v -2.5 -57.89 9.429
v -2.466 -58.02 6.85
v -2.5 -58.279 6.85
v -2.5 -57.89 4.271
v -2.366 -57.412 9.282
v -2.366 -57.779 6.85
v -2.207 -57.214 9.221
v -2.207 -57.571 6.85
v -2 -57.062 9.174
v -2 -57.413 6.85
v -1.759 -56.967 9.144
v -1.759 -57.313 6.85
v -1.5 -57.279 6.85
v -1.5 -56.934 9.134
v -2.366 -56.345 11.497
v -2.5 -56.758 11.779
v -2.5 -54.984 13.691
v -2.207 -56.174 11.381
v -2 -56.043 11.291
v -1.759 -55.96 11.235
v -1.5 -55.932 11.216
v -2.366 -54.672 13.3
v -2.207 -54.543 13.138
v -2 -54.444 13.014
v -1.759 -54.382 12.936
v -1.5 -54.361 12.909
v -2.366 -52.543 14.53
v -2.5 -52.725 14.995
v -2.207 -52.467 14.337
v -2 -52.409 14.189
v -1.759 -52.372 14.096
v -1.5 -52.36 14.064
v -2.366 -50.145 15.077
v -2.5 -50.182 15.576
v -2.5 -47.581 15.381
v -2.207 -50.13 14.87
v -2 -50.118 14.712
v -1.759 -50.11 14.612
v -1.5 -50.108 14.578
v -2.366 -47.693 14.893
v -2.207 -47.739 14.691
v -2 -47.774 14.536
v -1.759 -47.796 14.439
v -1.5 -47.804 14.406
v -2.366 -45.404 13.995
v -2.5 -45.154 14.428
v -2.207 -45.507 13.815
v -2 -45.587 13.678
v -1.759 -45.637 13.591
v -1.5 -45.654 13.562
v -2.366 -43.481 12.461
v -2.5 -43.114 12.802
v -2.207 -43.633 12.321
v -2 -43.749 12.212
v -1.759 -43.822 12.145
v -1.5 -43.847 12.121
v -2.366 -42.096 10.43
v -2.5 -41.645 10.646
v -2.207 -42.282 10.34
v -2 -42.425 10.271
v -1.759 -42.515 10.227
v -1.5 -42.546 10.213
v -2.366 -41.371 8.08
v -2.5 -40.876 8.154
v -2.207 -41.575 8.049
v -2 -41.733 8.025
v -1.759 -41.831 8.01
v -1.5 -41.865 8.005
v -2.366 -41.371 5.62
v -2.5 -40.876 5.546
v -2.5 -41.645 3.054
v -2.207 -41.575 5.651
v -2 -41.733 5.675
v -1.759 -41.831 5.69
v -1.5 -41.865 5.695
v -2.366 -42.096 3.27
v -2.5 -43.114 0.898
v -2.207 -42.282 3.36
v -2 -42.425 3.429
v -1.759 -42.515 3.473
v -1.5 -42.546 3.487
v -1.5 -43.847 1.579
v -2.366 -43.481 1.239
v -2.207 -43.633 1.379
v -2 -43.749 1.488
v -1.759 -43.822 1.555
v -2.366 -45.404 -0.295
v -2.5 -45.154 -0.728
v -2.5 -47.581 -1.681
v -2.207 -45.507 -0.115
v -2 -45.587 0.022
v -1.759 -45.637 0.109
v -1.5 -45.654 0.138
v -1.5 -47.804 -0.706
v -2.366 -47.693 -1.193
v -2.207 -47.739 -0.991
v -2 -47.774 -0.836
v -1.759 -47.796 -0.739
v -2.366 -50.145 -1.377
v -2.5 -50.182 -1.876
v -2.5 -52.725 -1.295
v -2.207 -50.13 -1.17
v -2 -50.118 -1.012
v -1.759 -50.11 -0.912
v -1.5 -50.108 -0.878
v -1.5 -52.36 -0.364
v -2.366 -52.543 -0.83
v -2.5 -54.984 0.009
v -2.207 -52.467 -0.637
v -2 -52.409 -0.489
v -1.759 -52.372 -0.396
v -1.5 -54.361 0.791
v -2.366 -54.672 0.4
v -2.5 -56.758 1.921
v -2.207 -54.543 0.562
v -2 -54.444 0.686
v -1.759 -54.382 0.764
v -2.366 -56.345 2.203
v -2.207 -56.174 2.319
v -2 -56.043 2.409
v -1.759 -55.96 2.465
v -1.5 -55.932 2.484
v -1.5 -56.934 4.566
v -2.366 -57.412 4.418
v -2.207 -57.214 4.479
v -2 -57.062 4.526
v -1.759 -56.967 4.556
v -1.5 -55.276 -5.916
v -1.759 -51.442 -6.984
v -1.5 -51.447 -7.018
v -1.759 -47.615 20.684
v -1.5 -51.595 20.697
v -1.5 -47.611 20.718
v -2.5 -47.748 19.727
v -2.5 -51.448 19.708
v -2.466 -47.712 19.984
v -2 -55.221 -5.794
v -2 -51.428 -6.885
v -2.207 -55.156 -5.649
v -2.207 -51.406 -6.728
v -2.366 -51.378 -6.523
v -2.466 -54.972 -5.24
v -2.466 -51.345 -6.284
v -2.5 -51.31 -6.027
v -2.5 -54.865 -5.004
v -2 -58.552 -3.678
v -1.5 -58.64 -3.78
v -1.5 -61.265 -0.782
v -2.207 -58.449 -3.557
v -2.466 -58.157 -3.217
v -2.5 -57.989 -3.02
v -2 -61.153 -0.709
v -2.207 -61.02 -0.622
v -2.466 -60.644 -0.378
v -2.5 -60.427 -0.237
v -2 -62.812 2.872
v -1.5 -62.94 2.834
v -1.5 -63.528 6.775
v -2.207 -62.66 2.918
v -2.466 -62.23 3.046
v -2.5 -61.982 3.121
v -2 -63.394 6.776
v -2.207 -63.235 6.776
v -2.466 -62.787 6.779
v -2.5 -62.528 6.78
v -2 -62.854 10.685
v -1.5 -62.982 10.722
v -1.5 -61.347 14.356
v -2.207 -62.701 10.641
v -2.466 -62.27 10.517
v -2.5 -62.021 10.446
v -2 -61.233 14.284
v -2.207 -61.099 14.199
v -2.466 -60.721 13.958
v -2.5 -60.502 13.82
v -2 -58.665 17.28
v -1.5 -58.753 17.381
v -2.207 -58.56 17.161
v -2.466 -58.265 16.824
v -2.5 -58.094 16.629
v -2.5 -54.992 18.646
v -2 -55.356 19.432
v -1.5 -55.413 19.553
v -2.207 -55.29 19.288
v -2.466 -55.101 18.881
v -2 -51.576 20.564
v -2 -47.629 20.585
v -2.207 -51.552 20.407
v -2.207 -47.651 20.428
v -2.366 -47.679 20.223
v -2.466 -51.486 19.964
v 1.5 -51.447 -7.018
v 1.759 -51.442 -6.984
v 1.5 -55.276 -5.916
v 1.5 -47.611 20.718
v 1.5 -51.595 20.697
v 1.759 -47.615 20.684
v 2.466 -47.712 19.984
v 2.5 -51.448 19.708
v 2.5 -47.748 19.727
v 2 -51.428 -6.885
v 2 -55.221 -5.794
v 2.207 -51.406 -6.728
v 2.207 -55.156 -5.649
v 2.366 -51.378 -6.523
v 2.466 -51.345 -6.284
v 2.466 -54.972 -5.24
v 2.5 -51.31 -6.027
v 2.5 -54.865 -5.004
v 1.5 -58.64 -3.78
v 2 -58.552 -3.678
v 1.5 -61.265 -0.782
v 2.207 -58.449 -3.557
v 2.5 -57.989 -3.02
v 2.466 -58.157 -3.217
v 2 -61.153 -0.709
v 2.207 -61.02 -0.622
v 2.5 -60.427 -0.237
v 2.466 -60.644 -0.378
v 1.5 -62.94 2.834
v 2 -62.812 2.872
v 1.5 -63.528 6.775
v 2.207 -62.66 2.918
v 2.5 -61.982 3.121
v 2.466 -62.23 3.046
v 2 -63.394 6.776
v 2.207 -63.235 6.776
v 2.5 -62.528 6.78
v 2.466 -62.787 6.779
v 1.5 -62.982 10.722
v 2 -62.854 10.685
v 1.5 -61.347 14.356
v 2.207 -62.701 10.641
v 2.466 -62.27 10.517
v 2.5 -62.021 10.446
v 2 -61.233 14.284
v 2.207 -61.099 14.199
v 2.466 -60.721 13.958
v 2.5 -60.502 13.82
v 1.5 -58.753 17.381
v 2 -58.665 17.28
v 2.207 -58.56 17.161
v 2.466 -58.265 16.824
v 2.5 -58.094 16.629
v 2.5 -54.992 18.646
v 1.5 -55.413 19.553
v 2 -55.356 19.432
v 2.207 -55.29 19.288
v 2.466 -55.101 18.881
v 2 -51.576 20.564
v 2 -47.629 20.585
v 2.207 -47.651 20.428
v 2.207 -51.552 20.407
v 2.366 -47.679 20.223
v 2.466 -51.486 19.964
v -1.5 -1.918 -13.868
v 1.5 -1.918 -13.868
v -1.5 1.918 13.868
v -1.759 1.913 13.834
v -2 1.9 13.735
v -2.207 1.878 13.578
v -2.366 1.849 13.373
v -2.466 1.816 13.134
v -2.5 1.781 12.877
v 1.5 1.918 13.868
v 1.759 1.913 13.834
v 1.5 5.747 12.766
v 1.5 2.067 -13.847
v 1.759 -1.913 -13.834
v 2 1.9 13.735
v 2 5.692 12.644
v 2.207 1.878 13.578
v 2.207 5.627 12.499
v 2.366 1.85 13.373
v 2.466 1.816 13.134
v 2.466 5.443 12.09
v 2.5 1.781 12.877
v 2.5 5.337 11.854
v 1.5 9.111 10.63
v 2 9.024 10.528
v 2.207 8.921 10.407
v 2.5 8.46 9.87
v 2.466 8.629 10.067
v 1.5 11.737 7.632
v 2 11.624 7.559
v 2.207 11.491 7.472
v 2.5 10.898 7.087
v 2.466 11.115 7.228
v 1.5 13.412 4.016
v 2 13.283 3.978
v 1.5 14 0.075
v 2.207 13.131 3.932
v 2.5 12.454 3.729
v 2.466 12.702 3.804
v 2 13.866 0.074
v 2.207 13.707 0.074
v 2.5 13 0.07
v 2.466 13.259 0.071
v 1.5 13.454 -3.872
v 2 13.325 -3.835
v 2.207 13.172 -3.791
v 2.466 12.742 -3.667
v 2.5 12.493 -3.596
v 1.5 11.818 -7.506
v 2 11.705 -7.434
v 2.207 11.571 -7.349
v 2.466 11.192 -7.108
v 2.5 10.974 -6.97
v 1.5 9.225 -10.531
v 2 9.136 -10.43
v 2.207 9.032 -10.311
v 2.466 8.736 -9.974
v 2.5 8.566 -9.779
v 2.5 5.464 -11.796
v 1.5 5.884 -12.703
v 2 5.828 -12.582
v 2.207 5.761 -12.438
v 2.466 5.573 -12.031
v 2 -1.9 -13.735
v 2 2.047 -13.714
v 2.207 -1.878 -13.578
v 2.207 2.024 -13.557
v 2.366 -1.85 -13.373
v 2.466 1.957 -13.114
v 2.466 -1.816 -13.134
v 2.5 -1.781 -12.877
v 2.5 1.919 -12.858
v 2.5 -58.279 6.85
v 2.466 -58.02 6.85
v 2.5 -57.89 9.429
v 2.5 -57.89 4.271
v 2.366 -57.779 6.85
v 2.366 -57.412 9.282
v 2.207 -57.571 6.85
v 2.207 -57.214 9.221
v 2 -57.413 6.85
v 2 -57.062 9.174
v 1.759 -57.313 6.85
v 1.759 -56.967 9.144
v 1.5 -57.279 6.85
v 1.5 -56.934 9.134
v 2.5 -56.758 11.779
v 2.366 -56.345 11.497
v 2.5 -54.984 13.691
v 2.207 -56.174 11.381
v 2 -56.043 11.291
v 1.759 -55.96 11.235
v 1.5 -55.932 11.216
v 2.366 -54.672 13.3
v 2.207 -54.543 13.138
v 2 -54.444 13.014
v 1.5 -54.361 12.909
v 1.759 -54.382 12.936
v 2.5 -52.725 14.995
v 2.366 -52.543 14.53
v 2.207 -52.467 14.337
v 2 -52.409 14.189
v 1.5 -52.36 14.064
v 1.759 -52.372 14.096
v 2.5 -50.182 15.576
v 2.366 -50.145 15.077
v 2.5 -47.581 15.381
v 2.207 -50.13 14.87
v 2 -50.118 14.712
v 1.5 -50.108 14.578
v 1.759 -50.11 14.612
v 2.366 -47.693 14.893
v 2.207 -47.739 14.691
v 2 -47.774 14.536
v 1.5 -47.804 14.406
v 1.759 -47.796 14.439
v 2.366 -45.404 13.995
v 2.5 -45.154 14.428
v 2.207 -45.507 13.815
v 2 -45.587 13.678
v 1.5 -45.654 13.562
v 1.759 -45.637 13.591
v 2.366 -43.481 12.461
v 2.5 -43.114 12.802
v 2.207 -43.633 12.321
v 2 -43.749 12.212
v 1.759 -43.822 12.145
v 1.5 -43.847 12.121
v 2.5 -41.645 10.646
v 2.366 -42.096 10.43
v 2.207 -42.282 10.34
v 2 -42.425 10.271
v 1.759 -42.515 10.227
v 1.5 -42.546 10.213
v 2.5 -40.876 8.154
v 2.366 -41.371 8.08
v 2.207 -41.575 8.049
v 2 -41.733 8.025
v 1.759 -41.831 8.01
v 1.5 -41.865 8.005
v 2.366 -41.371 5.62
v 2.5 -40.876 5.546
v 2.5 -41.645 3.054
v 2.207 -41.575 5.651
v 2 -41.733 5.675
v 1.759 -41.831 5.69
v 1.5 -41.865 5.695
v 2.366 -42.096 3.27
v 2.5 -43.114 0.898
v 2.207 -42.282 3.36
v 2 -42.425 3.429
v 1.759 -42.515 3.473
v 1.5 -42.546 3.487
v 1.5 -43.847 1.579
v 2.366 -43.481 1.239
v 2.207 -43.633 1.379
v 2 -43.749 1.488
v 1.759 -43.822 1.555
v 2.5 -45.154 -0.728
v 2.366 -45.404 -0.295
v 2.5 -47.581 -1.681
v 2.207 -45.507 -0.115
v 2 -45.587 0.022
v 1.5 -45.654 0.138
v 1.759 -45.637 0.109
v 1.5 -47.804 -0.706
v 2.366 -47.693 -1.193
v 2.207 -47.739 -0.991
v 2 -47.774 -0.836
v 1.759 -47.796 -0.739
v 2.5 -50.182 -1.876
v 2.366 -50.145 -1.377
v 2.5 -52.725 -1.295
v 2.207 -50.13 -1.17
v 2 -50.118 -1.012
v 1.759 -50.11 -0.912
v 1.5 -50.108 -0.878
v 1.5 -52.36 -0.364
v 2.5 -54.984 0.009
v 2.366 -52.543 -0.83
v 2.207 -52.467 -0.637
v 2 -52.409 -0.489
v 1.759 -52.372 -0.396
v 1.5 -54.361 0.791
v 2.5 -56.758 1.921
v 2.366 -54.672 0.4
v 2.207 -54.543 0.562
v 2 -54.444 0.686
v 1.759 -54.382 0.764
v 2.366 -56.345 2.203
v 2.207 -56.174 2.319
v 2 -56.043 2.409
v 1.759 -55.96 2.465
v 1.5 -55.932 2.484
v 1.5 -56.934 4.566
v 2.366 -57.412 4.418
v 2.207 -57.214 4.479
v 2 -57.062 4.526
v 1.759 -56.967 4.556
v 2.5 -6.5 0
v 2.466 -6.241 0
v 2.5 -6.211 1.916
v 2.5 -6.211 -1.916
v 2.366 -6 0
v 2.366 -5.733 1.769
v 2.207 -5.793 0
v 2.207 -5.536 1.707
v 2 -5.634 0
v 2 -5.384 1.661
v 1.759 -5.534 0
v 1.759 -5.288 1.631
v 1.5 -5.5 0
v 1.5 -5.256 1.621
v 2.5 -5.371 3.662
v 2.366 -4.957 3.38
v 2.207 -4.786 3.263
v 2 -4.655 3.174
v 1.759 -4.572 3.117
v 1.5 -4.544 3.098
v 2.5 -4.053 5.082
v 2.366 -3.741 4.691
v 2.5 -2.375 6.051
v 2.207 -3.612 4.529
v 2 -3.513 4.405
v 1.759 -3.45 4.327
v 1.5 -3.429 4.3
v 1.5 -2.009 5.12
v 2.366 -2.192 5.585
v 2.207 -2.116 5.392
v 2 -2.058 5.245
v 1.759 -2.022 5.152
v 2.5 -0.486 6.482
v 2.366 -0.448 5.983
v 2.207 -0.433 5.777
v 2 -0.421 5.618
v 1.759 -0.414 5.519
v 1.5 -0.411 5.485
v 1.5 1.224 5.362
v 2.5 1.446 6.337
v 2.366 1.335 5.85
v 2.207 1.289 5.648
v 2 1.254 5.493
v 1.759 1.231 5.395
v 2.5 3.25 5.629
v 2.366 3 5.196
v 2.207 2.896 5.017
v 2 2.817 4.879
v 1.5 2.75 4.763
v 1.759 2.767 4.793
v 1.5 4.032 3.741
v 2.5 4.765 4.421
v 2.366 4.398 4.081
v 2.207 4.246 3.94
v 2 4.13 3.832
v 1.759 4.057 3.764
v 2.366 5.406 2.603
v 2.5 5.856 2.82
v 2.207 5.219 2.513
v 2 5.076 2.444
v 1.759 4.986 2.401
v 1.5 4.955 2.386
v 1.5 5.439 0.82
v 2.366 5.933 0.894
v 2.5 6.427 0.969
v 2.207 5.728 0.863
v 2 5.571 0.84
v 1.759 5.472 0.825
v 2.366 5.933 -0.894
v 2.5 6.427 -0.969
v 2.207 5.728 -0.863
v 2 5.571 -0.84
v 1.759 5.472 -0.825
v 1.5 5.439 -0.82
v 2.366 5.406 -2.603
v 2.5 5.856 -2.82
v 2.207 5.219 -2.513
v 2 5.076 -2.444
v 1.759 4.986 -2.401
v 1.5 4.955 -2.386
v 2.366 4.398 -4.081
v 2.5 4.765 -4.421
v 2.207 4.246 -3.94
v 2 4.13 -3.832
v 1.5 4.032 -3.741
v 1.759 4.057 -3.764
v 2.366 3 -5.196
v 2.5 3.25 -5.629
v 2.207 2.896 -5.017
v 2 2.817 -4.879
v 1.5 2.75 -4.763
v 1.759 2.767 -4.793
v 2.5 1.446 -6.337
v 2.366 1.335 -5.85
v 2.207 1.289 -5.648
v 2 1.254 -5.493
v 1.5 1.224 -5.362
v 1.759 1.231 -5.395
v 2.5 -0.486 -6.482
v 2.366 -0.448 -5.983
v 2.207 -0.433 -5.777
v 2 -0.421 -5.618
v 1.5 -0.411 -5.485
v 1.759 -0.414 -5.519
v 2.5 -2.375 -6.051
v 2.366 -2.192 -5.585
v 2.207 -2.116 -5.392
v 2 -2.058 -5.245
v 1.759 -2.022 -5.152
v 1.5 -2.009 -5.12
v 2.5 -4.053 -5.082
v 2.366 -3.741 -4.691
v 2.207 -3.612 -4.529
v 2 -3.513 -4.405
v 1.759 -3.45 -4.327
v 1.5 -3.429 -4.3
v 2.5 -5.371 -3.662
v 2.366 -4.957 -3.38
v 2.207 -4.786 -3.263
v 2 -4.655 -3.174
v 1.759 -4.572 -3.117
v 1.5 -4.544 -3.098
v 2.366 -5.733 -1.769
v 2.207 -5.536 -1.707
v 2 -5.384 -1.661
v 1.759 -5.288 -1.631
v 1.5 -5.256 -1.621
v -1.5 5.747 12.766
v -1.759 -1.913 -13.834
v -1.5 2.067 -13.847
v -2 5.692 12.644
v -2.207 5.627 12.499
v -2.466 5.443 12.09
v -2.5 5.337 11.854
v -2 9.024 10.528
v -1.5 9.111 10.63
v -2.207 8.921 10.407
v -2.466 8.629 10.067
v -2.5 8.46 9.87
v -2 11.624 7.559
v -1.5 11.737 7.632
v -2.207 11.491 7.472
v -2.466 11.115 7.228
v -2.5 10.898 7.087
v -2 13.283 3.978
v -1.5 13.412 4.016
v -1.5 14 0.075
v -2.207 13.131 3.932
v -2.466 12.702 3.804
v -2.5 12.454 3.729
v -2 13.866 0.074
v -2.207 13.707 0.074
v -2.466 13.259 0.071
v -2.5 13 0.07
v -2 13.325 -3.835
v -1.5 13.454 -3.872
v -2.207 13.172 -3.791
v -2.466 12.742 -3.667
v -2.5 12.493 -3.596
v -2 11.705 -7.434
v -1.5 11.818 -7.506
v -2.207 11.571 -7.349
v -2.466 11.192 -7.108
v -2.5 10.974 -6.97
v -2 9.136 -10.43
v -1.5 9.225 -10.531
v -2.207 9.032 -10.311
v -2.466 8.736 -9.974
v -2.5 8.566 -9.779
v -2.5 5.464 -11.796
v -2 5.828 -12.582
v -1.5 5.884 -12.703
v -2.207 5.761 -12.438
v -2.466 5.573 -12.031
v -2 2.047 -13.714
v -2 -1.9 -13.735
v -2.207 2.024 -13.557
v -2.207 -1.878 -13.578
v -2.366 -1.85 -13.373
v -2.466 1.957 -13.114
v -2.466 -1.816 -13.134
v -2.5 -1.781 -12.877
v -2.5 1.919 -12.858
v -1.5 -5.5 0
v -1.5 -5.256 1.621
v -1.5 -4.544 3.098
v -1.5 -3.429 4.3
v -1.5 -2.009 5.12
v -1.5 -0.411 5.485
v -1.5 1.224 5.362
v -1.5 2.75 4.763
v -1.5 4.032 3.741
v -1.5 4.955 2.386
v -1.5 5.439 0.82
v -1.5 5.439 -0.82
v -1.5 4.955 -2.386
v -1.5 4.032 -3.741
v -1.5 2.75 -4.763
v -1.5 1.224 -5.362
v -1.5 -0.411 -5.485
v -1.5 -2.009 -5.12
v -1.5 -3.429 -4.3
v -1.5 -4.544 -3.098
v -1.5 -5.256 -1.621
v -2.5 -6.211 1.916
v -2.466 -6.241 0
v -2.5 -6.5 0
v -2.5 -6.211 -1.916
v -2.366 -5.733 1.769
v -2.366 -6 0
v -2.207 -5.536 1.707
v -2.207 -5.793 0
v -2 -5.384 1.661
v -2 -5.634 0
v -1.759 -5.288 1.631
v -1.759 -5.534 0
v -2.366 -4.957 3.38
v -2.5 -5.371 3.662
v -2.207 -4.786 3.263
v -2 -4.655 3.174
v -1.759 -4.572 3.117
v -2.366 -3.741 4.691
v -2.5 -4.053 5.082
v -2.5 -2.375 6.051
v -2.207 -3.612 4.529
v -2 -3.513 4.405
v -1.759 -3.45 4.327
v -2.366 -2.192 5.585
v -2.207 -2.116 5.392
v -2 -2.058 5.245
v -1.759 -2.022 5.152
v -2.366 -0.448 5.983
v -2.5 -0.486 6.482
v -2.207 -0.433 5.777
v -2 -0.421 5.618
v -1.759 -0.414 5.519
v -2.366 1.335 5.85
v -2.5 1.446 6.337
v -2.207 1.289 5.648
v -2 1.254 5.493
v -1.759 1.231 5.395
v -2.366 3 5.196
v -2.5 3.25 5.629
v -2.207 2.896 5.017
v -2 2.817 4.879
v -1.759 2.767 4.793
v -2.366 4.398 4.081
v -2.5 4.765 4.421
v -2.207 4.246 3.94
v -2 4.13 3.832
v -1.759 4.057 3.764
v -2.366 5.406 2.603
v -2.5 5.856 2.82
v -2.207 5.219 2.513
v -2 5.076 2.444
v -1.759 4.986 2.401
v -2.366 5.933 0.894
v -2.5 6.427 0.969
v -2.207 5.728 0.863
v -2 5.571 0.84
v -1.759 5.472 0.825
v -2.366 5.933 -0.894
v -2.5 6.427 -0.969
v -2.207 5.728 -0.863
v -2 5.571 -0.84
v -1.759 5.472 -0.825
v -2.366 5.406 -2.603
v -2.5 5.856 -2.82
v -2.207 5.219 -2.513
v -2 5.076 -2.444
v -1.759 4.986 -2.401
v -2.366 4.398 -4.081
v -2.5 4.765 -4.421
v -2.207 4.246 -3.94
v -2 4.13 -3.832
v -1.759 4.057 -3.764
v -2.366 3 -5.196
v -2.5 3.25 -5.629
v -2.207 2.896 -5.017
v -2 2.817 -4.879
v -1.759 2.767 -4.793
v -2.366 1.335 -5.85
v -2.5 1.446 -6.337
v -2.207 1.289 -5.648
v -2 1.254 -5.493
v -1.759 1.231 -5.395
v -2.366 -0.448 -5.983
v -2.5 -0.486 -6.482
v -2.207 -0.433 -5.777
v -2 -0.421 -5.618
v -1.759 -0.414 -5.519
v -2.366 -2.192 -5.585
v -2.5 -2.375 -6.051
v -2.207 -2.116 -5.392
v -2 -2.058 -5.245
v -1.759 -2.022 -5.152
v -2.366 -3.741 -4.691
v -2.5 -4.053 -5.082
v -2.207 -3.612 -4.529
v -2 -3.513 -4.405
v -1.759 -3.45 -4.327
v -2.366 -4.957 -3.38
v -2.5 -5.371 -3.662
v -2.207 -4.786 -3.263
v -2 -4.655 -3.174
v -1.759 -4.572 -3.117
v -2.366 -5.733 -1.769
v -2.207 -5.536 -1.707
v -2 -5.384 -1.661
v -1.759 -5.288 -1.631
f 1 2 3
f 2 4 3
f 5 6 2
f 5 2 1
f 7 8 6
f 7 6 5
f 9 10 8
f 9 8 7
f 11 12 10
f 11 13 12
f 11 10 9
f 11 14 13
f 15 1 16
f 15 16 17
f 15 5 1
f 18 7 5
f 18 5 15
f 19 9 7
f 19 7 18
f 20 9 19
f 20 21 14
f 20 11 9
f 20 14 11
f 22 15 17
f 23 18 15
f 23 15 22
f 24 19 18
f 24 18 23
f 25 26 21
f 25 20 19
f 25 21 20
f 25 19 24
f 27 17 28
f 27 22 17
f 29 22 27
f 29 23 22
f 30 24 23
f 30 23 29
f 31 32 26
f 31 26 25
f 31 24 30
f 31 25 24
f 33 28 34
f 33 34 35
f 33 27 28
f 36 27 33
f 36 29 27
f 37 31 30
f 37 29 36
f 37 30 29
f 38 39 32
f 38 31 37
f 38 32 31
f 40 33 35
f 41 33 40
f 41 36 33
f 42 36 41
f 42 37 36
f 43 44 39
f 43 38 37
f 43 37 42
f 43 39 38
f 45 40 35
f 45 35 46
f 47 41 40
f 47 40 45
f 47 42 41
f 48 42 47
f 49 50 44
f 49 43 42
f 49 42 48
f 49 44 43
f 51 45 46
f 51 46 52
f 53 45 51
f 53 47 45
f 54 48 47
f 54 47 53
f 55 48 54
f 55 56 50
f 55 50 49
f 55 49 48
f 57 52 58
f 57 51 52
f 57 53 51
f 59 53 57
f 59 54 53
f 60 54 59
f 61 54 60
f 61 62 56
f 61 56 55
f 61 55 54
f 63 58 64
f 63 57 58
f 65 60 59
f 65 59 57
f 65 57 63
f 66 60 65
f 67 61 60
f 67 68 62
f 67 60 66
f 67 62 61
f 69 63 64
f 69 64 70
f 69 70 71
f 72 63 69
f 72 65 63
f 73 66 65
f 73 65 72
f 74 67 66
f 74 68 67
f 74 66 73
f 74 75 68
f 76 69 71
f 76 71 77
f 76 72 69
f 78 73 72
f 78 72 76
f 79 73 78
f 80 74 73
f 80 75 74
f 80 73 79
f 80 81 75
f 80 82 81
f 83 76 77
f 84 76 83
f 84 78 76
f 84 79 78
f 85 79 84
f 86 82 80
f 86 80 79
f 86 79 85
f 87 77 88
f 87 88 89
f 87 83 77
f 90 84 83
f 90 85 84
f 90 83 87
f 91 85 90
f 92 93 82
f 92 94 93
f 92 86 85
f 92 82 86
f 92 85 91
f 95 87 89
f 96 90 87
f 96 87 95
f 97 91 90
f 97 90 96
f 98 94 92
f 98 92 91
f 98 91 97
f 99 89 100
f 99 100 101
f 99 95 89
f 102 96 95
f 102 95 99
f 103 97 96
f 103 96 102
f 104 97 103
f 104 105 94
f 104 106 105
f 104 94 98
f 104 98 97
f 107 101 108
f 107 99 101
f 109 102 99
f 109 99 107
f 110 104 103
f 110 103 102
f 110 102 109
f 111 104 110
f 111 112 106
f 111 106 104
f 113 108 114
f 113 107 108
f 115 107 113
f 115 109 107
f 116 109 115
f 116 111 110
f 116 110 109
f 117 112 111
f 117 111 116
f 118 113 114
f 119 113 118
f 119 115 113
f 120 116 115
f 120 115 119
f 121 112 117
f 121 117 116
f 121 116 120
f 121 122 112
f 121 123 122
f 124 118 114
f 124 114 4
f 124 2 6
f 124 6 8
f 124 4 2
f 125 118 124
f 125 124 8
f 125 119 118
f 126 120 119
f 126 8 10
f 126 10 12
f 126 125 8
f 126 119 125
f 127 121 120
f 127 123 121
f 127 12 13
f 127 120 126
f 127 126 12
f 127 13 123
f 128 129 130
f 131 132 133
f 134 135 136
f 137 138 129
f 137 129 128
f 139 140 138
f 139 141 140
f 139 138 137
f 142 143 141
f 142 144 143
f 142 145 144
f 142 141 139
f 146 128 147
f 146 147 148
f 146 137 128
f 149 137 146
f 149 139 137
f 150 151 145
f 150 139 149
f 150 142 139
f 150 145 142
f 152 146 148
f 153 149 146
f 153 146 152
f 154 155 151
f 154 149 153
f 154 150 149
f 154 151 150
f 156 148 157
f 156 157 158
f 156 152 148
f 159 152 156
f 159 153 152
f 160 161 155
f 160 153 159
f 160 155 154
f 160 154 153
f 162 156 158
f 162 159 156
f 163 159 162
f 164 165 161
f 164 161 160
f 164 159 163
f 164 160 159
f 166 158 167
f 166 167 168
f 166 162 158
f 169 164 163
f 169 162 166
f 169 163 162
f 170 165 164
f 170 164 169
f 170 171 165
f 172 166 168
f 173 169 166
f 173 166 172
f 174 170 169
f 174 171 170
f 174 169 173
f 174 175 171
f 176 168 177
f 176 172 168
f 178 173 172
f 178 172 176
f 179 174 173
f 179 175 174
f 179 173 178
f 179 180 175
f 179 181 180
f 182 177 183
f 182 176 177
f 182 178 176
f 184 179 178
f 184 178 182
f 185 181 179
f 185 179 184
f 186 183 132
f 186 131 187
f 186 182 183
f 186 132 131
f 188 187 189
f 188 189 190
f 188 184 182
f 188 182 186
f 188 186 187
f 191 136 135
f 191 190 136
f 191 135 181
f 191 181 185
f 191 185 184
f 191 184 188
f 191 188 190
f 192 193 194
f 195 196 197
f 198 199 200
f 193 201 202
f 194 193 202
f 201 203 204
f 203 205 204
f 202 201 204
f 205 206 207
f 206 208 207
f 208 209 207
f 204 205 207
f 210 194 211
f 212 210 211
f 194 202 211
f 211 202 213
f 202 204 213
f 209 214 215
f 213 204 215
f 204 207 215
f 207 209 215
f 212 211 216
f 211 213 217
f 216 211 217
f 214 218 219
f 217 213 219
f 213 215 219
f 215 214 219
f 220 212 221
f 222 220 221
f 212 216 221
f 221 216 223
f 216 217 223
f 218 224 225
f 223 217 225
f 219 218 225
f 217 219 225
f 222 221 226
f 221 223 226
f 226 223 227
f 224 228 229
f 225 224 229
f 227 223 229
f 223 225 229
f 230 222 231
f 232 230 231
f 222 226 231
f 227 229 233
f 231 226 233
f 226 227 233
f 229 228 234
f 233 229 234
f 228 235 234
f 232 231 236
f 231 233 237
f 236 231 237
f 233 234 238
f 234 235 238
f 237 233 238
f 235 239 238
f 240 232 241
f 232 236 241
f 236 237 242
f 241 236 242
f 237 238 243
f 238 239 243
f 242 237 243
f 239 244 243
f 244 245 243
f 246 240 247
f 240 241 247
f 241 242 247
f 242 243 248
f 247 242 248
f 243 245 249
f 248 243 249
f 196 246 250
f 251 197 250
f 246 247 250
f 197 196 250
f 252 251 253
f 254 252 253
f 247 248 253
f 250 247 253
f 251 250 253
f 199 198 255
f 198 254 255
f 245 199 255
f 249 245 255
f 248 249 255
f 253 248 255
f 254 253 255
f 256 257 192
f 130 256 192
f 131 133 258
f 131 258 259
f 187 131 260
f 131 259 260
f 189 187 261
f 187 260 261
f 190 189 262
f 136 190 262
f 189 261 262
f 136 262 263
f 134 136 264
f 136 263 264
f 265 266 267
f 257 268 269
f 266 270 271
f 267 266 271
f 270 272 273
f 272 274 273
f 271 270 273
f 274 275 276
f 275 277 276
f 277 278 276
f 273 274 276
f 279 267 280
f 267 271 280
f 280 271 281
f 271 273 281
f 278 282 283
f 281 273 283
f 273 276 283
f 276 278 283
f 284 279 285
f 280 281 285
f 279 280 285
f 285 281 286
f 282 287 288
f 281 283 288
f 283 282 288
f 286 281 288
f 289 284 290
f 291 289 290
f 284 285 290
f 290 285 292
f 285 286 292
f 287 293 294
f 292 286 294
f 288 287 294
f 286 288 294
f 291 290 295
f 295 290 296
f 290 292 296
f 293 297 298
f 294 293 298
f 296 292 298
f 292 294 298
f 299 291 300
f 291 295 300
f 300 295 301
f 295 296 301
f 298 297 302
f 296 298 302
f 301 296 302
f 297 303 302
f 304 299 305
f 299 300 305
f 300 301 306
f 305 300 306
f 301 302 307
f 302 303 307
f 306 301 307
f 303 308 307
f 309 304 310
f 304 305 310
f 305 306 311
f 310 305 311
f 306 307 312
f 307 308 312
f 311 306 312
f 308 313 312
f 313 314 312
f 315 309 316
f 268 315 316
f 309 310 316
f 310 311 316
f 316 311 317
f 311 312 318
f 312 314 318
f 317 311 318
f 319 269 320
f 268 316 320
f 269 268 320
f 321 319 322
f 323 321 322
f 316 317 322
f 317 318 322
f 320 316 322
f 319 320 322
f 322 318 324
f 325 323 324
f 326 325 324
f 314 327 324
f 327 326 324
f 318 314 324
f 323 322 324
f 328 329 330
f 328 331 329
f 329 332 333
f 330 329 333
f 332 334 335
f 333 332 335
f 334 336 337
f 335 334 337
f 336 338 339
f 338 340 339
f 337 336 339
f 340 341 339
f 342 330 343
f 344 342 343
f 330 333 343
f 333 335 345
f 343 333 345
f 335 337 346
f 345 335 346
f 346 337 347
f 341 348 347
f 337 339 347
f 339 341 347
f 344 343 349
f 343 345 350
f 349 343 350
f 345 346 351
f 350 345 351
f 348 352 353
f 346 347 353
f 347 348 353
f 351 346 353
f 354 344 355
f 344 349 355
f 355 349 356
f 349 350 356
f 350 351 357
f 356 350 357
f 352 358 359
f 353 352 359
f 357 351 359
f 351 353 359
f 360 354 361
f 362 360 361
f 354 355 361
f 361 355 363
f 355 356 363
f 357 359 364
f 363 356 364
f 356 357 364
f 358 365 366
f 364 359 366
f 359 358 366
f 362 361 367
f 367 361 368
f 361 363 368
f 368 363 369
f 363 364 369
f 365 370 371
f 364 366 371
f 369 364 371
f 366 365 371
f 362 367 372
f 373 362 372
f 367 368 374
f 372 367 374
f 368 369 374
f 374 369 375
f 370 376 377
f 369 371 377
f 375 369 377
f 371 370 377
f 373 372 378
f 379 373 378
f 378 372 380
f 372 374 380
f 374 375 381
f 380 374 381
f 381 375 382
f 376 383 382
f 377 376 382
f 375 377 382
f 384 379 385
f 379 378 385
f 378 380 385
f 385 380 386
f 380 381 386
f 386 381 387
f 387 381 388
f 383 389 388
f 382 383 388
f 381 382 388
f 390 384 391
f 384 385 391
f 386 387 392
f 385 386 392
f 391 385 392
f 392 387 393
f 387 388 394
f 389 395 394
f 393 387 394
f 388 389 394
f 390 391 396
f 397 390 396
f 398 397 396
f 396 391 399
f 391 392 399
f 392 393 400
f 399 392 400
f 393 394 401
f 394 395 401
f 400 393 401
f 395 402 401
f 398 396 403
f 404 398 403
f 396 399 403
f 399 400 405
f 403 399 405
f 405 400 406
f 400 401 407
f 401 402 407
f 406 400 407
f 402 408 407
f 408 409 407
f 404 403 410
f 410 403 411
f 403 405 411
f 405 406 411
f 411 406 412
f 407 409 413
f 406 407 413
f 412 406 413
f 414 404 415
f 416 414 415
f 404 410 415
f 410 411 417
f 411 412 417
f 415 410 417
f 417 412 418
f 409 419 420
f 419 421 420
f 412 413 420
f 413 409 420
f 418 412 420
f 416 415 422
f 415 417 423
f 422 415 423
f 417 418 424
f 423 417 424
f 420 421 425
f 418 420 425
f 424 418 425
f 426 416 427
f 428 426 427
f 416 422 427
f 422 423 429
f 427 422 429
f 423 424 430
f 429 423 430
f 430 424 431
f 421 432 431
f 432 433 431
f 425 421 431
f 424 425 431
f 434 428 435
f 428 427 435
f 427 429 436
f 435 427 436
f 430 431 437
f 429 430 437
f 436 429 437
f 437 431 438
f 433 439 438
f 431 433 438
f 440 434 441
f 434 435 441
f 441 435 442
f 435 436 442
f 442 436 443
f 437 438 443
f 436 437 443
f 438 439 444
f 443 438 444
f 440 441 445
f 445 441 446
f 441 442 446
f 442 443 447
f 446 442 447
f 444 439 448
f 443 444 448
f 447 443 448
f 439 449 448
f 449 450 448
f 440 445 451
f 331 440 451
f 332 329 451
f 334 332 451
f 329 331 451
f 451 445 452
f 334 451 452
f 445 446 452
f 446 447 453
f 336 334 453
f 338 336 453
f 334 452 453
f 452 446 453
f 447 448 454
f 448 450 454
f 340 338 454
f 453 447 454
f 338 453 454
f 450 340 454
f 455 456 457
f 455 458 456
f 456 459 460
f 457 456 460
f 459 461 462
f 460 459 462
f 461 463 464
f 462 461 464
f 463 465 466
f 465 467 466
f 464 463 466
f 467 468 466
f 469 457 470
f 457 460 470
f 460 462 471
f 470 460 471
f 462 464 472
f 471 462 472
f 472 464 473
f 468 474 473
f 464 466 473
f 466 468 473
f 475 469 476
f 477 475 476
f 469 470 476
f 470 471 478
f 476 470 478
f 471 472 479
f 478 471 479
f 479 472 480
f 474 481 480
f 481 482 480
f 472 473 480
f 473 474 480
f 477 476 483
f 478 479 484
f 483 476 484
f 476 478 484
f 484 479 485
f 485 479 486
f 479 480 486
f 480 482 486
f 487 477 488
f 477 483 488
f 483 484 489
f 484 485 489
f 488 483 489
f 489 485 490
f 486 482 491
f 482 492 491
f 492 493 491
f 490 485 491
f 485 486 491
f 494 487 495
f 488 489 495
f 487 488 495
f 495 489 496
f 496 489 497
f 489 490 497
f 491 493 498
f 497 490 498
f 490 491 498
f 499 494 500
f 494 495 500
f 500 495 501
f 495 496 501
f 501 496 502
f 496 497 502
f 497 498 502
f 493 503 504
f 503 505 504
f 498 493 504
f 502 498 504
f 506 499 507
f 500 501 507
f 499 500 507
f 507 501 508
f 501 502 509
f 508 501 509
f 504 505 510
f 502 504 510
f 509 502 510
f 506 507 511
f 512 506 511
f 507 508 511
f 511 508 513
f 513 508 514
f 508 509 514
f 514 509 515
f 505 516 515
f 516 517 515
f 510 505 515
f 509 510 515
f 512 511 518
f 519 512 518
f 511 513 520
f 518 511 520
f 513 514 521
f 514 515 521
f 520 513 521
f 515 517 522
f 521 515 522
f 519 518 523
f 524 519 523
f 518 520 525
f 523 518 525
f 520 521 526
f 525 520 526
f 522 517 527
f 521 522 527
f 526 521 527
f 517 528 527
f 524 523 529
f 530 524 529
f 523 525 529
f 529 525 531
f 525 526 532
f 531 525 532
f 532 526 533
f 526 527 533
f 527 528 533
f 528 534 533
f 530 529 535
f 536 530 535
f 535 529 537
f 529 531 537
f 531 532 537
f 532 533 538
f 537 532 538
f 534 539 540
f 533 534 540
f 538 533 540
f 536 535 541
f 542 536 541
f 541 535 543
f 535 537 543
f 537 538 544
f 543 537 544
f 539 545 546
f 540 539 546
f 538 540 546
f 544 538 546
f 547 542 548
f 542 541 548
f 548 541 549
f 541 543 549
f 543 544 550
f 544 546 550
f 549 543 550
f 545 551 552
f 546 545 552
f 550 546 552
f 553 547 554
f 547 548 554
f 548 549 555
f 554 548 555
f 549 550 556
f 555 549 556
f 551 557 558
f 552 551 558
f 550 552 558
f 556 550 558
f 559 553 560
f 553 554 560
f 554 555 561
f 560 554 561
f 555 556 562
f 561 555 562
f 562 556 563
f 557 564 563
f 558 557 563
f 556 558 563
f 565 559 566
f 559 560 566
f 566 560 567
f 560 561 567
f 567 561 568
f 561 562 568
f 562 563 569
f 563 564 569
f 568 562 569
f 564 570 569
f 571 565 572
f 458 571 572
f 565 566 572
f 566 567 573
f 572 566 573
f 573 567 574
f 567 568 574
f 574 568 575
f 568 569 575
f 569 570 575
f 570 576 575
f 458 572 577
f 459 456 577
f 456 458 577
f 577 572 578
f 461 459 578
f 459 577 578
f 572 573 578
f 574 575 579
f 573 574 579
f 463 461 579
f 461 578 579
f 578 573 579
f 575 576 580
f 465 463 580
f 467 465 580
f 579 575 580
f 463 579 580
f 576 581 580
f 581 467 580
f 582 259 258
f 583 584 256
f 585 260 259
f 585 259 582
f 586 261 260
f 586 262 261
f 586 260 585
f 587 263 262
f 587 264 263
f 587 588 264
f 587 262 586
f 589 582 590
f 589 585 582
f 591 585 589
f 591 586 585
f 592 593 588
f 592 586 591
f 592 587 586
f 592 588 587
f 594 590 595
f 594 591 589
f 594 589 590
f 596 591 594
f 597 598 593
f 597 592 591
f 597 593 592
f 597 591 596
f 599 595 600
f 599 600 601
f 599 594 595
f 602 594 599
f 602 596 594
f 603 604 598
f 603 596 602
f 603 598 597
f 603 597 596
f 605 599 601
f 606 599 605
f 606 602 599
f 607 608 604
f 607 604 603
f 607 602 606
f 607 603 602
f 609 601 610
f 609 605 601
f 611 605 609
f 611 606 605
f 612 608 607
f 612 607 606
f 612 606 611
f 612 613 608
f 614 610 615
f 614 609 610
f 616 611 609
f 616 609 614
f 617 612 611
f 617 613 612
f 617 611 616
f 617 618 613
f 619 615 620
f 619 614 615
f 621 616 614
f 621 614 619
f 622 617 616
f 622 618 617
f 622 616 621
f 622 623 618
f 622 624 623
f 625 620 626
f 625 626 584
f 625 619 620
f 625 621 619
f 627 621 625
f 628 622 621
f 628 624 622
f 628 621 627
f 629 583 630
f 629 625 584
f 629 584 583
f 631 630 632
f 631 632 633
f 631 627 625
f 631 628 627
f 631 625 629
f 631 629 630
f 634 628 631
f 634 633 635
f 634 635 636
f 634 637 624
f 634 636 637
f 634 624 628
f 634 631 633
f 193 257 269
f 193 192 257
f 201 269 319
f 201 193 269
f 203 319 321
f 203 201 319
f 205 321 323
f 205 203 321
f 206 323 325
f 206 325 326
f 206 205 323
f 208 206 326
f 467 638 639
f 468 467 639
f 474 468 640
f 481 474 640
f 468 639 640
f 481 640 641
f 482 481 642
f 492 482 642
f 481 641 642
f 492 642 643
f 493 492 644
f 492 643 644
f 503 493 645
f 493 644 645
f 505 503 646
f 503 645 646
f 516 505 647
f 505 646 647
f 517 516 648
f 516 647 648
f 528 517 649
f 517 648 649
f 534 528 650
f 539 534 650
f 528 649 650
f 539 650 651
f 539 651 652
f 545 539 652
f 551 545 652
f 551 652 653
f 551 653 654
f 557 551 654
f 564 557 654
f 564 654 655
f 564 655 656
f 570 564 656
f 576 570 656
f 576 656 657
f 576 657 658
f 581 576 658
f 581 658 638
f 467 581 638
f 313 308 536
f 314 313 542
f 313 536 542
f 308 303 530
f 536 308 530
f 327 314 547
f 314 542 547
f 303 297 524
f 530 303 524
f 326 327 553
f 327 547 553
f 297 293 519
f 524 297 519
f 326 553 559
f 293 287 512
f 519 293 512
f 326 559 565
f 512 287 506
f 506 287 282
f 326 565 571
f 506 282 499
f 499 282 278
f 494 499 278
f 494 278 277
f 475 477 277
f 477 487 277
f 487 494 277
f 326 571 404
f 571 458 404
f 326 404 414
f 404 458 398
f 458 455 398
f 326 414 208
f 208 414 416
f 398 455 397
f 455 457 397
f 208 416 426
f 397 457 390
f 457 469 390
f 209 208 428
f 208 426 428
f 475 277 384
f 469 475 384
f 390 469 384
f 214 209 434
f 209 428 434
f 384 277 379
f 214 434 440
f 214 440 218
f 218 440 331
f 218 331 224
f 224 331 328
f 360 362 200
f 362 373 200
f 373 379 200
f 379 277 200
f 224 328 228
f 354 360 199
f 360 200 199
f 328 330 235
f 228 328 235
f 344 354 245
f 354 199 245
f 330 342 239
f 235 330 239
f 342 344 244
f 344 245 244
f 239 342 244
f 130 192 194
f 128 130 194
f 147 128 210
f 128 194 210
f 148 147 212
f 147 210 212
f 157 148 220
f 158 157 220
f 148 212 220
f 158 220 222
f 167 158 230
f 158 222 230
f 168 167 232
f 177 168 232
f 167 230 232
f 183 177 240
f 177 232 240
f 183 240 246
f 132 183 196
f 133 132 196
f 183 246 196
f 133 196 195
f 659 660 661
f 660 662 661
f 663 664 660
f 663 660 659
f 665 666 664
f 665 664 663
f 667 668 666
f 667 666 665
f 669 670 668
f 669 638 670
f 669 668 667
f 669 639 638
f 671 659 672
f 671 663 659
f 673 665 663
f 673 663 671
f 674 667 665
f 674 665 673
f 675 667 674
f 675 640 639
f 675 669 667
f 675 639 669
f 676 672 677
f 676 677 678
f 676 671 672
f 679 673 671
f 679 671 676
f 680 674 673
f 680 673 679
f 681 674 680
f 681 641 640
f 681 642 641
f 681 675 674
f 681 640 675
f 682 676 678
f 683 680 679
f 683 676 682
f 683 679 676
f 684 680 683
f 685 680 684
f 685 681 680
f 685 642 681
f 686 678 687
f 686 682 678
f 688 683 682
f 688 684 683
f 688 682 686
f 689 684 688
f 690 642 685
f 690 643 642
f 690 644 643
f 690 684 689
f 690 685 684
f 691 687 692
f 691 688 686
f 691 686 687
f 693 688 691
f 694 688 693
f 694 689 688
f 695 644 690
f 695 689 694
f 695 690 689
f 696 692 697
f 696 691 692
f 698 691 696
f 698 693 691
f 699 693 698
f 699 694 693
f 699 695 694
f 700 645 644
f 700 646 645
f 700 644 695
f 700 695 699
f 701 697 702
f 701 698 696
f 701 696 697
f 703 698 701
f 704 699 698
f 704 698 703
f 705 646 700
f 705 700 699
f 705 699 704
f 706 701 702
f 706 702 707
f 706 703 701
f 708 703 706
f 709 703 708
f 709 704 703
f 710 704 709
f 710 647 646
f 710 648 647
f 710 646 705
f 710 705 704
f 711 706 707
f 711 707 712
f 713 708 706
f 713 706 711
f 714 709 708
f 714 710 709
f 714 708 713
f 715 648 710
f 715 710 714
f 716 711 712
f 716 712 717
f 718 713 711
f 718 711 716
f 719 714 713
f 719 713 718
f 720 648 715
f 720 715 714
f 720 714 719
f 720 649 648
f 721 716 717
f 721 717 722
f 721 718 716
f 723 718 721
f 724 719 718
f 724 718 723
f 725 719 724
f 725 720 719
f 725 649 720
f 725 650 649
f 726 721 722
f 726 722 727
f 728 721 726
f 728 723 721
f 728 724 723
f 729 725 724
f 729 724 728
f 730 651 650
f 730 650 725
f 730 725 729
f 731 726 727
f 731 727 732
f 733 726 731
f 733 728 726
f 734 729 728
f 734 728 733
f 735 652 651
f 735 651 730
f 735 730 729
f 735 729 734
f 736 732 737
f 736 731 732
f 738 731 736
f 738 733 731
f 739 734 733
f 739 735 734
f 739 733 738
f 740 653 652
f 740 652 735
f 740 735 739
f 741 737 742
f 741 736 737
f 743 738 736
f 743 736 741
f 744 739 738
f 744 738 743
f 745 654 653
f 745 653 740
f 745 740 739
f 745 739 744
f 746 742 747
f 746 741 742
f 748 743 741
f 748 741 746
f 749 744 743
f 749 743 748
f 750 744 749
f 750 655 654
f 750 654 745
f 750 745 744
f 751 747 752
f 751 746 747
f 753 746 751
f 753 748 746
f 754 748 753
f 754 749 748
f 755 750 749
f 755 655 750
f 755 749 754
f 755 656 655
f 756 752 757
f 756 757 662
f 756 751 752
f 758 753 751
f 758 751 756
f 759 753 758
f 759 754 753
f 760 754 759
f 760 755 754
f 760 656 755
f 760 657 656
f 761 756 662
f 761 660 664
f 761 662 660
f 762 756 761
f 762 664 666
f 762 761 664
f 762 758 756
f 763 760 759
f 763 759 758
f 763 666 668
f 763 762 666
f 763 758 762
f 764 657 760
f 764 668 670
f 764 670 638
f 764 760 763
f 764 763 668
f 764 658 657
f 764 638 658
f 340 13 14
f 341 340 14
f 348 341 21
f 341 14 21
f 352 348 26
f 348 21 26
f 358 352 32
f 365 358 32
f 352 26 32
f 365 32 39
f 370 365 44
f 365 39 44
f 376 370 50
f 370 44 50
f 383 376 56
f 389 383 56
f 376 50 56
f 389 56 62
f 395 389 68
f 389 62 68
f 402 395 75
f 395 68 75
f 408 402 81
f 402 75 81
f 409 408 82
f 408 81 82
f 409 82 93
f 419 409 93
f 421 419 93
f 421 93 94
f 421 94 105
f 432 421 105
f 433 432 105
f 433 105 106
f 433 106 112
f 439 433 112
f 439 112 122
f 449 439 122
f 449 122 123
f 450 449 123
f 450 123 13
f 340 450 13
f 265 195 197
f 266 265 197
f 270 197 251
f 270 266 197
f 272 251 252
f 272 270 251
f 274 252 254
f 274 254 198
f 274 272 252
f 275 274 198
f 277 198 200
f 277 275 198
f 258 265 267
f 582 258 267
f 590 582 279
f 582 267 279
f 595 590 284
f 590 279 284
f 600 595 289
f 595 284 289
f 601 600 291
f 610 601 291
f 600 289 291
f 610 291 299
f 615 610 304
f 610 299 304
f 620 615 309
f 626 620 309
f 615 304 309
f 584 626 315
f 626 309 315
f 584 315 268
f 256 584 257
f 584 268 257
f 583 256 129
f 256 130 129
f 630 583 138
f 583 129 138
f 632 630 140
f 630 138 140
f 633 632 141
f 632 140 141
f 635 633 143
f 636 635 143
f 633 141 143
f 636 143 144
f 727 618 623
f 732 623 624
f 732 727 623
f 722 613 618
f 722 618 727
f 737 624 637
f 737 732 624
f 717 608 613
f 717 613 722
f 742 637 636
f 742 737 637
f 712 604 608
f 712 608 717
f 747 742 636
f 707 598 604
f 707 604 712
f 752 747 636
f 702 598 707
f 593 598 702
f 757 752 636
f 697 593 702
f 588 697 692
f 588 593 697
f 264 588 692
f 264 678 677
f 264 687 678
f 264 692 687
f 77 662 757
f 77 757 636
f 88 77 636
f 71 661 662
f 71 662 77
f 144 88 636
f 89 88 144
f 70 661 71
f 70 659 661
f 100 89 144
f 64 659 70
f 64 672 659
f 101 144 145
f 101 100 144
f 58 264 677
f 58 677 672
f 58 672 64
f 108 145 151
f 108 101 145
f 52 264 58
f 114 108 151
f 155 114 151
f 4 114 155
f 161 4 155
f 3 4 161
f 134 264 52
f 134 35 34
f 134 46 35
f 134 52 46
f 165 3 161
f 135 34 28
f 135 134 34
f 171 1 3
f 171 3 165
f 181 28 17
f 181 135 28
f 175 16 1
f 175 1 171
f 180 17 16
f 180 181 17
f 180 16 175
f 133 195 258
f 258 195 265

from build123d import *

# Parameters (mm, degrees)
BOSS_EXTRUDE1_DEPTH   = 2.5
M14_CLEARANCE_HOLE1_D = 15.5
M10_CLEARANCE_HOLE1_D = 11
FILLET1_R             = 1


with BuildPart() as part:
    # Sketch1 → Boss-Extrude1 (new, symmetric)
    with BuildSketch(Plane.YZ):
        with BuildLine():
            Line((-47.610552371, 20.717994664), (1.918, 13.867994664))
            ThreePointArc((1.918, 13.867994664), (13.867994664, -1.918), (-1.918, -13.867994664))
            Line((-1.918, -13.867994664), (-51.446552371, -7.017994664))
            ThreePointArc((-51.446552371, -7.017994664), (-63.396547035, 8.768), (-47.610552371, 20.717994664))
        make_face()
    extrude(amount=BOSS_EXTRUDE1_DEPTH, both=True)

    # M14 Clearance Hole1 (through all)
    with Locations(Plane.YZ.offset(2.5)):
        with Locations((-49.528552371, 6.85)):
            Hole(M14_CLEARANCE_HOLE1_D / 2)

    # M10 Clearance Hole1 (through all)
    with Locations(Plane.YZ.offset(2.5)):
        with Locations((0, 0)):
            Hole(M10_CLEARANCE_HOLE1_D / 2)

    # Fillet1
    fillet1_edges = [part.edges().sort_by_distance(p)[0] for p in [
        (2.5, 13.867994664, -1.918),
        (2.5, -22.846276186, 17.292994664),
        (2.5, -41.778552371, 6.85),
        (-2.5, -41.778552371, 6.85),
        (2.5, 5.5, 0),
        (-2.5, 5.5, 0),
        (2.5, -63.396547035, 8.768),
        (-2.5, -22.846276186, 17.292994664),
        (-2.5, 13.867994664, -1.918),
        (-2.5, -26.682276186, -10.442994664),
        (-2.5, -63.396547035, 8.768),
        (2.5, -26.682276186, -10.442994664),
    ]]
    fillet(fillet1_edges, radius=FILLET1_R)


solid = part.part
